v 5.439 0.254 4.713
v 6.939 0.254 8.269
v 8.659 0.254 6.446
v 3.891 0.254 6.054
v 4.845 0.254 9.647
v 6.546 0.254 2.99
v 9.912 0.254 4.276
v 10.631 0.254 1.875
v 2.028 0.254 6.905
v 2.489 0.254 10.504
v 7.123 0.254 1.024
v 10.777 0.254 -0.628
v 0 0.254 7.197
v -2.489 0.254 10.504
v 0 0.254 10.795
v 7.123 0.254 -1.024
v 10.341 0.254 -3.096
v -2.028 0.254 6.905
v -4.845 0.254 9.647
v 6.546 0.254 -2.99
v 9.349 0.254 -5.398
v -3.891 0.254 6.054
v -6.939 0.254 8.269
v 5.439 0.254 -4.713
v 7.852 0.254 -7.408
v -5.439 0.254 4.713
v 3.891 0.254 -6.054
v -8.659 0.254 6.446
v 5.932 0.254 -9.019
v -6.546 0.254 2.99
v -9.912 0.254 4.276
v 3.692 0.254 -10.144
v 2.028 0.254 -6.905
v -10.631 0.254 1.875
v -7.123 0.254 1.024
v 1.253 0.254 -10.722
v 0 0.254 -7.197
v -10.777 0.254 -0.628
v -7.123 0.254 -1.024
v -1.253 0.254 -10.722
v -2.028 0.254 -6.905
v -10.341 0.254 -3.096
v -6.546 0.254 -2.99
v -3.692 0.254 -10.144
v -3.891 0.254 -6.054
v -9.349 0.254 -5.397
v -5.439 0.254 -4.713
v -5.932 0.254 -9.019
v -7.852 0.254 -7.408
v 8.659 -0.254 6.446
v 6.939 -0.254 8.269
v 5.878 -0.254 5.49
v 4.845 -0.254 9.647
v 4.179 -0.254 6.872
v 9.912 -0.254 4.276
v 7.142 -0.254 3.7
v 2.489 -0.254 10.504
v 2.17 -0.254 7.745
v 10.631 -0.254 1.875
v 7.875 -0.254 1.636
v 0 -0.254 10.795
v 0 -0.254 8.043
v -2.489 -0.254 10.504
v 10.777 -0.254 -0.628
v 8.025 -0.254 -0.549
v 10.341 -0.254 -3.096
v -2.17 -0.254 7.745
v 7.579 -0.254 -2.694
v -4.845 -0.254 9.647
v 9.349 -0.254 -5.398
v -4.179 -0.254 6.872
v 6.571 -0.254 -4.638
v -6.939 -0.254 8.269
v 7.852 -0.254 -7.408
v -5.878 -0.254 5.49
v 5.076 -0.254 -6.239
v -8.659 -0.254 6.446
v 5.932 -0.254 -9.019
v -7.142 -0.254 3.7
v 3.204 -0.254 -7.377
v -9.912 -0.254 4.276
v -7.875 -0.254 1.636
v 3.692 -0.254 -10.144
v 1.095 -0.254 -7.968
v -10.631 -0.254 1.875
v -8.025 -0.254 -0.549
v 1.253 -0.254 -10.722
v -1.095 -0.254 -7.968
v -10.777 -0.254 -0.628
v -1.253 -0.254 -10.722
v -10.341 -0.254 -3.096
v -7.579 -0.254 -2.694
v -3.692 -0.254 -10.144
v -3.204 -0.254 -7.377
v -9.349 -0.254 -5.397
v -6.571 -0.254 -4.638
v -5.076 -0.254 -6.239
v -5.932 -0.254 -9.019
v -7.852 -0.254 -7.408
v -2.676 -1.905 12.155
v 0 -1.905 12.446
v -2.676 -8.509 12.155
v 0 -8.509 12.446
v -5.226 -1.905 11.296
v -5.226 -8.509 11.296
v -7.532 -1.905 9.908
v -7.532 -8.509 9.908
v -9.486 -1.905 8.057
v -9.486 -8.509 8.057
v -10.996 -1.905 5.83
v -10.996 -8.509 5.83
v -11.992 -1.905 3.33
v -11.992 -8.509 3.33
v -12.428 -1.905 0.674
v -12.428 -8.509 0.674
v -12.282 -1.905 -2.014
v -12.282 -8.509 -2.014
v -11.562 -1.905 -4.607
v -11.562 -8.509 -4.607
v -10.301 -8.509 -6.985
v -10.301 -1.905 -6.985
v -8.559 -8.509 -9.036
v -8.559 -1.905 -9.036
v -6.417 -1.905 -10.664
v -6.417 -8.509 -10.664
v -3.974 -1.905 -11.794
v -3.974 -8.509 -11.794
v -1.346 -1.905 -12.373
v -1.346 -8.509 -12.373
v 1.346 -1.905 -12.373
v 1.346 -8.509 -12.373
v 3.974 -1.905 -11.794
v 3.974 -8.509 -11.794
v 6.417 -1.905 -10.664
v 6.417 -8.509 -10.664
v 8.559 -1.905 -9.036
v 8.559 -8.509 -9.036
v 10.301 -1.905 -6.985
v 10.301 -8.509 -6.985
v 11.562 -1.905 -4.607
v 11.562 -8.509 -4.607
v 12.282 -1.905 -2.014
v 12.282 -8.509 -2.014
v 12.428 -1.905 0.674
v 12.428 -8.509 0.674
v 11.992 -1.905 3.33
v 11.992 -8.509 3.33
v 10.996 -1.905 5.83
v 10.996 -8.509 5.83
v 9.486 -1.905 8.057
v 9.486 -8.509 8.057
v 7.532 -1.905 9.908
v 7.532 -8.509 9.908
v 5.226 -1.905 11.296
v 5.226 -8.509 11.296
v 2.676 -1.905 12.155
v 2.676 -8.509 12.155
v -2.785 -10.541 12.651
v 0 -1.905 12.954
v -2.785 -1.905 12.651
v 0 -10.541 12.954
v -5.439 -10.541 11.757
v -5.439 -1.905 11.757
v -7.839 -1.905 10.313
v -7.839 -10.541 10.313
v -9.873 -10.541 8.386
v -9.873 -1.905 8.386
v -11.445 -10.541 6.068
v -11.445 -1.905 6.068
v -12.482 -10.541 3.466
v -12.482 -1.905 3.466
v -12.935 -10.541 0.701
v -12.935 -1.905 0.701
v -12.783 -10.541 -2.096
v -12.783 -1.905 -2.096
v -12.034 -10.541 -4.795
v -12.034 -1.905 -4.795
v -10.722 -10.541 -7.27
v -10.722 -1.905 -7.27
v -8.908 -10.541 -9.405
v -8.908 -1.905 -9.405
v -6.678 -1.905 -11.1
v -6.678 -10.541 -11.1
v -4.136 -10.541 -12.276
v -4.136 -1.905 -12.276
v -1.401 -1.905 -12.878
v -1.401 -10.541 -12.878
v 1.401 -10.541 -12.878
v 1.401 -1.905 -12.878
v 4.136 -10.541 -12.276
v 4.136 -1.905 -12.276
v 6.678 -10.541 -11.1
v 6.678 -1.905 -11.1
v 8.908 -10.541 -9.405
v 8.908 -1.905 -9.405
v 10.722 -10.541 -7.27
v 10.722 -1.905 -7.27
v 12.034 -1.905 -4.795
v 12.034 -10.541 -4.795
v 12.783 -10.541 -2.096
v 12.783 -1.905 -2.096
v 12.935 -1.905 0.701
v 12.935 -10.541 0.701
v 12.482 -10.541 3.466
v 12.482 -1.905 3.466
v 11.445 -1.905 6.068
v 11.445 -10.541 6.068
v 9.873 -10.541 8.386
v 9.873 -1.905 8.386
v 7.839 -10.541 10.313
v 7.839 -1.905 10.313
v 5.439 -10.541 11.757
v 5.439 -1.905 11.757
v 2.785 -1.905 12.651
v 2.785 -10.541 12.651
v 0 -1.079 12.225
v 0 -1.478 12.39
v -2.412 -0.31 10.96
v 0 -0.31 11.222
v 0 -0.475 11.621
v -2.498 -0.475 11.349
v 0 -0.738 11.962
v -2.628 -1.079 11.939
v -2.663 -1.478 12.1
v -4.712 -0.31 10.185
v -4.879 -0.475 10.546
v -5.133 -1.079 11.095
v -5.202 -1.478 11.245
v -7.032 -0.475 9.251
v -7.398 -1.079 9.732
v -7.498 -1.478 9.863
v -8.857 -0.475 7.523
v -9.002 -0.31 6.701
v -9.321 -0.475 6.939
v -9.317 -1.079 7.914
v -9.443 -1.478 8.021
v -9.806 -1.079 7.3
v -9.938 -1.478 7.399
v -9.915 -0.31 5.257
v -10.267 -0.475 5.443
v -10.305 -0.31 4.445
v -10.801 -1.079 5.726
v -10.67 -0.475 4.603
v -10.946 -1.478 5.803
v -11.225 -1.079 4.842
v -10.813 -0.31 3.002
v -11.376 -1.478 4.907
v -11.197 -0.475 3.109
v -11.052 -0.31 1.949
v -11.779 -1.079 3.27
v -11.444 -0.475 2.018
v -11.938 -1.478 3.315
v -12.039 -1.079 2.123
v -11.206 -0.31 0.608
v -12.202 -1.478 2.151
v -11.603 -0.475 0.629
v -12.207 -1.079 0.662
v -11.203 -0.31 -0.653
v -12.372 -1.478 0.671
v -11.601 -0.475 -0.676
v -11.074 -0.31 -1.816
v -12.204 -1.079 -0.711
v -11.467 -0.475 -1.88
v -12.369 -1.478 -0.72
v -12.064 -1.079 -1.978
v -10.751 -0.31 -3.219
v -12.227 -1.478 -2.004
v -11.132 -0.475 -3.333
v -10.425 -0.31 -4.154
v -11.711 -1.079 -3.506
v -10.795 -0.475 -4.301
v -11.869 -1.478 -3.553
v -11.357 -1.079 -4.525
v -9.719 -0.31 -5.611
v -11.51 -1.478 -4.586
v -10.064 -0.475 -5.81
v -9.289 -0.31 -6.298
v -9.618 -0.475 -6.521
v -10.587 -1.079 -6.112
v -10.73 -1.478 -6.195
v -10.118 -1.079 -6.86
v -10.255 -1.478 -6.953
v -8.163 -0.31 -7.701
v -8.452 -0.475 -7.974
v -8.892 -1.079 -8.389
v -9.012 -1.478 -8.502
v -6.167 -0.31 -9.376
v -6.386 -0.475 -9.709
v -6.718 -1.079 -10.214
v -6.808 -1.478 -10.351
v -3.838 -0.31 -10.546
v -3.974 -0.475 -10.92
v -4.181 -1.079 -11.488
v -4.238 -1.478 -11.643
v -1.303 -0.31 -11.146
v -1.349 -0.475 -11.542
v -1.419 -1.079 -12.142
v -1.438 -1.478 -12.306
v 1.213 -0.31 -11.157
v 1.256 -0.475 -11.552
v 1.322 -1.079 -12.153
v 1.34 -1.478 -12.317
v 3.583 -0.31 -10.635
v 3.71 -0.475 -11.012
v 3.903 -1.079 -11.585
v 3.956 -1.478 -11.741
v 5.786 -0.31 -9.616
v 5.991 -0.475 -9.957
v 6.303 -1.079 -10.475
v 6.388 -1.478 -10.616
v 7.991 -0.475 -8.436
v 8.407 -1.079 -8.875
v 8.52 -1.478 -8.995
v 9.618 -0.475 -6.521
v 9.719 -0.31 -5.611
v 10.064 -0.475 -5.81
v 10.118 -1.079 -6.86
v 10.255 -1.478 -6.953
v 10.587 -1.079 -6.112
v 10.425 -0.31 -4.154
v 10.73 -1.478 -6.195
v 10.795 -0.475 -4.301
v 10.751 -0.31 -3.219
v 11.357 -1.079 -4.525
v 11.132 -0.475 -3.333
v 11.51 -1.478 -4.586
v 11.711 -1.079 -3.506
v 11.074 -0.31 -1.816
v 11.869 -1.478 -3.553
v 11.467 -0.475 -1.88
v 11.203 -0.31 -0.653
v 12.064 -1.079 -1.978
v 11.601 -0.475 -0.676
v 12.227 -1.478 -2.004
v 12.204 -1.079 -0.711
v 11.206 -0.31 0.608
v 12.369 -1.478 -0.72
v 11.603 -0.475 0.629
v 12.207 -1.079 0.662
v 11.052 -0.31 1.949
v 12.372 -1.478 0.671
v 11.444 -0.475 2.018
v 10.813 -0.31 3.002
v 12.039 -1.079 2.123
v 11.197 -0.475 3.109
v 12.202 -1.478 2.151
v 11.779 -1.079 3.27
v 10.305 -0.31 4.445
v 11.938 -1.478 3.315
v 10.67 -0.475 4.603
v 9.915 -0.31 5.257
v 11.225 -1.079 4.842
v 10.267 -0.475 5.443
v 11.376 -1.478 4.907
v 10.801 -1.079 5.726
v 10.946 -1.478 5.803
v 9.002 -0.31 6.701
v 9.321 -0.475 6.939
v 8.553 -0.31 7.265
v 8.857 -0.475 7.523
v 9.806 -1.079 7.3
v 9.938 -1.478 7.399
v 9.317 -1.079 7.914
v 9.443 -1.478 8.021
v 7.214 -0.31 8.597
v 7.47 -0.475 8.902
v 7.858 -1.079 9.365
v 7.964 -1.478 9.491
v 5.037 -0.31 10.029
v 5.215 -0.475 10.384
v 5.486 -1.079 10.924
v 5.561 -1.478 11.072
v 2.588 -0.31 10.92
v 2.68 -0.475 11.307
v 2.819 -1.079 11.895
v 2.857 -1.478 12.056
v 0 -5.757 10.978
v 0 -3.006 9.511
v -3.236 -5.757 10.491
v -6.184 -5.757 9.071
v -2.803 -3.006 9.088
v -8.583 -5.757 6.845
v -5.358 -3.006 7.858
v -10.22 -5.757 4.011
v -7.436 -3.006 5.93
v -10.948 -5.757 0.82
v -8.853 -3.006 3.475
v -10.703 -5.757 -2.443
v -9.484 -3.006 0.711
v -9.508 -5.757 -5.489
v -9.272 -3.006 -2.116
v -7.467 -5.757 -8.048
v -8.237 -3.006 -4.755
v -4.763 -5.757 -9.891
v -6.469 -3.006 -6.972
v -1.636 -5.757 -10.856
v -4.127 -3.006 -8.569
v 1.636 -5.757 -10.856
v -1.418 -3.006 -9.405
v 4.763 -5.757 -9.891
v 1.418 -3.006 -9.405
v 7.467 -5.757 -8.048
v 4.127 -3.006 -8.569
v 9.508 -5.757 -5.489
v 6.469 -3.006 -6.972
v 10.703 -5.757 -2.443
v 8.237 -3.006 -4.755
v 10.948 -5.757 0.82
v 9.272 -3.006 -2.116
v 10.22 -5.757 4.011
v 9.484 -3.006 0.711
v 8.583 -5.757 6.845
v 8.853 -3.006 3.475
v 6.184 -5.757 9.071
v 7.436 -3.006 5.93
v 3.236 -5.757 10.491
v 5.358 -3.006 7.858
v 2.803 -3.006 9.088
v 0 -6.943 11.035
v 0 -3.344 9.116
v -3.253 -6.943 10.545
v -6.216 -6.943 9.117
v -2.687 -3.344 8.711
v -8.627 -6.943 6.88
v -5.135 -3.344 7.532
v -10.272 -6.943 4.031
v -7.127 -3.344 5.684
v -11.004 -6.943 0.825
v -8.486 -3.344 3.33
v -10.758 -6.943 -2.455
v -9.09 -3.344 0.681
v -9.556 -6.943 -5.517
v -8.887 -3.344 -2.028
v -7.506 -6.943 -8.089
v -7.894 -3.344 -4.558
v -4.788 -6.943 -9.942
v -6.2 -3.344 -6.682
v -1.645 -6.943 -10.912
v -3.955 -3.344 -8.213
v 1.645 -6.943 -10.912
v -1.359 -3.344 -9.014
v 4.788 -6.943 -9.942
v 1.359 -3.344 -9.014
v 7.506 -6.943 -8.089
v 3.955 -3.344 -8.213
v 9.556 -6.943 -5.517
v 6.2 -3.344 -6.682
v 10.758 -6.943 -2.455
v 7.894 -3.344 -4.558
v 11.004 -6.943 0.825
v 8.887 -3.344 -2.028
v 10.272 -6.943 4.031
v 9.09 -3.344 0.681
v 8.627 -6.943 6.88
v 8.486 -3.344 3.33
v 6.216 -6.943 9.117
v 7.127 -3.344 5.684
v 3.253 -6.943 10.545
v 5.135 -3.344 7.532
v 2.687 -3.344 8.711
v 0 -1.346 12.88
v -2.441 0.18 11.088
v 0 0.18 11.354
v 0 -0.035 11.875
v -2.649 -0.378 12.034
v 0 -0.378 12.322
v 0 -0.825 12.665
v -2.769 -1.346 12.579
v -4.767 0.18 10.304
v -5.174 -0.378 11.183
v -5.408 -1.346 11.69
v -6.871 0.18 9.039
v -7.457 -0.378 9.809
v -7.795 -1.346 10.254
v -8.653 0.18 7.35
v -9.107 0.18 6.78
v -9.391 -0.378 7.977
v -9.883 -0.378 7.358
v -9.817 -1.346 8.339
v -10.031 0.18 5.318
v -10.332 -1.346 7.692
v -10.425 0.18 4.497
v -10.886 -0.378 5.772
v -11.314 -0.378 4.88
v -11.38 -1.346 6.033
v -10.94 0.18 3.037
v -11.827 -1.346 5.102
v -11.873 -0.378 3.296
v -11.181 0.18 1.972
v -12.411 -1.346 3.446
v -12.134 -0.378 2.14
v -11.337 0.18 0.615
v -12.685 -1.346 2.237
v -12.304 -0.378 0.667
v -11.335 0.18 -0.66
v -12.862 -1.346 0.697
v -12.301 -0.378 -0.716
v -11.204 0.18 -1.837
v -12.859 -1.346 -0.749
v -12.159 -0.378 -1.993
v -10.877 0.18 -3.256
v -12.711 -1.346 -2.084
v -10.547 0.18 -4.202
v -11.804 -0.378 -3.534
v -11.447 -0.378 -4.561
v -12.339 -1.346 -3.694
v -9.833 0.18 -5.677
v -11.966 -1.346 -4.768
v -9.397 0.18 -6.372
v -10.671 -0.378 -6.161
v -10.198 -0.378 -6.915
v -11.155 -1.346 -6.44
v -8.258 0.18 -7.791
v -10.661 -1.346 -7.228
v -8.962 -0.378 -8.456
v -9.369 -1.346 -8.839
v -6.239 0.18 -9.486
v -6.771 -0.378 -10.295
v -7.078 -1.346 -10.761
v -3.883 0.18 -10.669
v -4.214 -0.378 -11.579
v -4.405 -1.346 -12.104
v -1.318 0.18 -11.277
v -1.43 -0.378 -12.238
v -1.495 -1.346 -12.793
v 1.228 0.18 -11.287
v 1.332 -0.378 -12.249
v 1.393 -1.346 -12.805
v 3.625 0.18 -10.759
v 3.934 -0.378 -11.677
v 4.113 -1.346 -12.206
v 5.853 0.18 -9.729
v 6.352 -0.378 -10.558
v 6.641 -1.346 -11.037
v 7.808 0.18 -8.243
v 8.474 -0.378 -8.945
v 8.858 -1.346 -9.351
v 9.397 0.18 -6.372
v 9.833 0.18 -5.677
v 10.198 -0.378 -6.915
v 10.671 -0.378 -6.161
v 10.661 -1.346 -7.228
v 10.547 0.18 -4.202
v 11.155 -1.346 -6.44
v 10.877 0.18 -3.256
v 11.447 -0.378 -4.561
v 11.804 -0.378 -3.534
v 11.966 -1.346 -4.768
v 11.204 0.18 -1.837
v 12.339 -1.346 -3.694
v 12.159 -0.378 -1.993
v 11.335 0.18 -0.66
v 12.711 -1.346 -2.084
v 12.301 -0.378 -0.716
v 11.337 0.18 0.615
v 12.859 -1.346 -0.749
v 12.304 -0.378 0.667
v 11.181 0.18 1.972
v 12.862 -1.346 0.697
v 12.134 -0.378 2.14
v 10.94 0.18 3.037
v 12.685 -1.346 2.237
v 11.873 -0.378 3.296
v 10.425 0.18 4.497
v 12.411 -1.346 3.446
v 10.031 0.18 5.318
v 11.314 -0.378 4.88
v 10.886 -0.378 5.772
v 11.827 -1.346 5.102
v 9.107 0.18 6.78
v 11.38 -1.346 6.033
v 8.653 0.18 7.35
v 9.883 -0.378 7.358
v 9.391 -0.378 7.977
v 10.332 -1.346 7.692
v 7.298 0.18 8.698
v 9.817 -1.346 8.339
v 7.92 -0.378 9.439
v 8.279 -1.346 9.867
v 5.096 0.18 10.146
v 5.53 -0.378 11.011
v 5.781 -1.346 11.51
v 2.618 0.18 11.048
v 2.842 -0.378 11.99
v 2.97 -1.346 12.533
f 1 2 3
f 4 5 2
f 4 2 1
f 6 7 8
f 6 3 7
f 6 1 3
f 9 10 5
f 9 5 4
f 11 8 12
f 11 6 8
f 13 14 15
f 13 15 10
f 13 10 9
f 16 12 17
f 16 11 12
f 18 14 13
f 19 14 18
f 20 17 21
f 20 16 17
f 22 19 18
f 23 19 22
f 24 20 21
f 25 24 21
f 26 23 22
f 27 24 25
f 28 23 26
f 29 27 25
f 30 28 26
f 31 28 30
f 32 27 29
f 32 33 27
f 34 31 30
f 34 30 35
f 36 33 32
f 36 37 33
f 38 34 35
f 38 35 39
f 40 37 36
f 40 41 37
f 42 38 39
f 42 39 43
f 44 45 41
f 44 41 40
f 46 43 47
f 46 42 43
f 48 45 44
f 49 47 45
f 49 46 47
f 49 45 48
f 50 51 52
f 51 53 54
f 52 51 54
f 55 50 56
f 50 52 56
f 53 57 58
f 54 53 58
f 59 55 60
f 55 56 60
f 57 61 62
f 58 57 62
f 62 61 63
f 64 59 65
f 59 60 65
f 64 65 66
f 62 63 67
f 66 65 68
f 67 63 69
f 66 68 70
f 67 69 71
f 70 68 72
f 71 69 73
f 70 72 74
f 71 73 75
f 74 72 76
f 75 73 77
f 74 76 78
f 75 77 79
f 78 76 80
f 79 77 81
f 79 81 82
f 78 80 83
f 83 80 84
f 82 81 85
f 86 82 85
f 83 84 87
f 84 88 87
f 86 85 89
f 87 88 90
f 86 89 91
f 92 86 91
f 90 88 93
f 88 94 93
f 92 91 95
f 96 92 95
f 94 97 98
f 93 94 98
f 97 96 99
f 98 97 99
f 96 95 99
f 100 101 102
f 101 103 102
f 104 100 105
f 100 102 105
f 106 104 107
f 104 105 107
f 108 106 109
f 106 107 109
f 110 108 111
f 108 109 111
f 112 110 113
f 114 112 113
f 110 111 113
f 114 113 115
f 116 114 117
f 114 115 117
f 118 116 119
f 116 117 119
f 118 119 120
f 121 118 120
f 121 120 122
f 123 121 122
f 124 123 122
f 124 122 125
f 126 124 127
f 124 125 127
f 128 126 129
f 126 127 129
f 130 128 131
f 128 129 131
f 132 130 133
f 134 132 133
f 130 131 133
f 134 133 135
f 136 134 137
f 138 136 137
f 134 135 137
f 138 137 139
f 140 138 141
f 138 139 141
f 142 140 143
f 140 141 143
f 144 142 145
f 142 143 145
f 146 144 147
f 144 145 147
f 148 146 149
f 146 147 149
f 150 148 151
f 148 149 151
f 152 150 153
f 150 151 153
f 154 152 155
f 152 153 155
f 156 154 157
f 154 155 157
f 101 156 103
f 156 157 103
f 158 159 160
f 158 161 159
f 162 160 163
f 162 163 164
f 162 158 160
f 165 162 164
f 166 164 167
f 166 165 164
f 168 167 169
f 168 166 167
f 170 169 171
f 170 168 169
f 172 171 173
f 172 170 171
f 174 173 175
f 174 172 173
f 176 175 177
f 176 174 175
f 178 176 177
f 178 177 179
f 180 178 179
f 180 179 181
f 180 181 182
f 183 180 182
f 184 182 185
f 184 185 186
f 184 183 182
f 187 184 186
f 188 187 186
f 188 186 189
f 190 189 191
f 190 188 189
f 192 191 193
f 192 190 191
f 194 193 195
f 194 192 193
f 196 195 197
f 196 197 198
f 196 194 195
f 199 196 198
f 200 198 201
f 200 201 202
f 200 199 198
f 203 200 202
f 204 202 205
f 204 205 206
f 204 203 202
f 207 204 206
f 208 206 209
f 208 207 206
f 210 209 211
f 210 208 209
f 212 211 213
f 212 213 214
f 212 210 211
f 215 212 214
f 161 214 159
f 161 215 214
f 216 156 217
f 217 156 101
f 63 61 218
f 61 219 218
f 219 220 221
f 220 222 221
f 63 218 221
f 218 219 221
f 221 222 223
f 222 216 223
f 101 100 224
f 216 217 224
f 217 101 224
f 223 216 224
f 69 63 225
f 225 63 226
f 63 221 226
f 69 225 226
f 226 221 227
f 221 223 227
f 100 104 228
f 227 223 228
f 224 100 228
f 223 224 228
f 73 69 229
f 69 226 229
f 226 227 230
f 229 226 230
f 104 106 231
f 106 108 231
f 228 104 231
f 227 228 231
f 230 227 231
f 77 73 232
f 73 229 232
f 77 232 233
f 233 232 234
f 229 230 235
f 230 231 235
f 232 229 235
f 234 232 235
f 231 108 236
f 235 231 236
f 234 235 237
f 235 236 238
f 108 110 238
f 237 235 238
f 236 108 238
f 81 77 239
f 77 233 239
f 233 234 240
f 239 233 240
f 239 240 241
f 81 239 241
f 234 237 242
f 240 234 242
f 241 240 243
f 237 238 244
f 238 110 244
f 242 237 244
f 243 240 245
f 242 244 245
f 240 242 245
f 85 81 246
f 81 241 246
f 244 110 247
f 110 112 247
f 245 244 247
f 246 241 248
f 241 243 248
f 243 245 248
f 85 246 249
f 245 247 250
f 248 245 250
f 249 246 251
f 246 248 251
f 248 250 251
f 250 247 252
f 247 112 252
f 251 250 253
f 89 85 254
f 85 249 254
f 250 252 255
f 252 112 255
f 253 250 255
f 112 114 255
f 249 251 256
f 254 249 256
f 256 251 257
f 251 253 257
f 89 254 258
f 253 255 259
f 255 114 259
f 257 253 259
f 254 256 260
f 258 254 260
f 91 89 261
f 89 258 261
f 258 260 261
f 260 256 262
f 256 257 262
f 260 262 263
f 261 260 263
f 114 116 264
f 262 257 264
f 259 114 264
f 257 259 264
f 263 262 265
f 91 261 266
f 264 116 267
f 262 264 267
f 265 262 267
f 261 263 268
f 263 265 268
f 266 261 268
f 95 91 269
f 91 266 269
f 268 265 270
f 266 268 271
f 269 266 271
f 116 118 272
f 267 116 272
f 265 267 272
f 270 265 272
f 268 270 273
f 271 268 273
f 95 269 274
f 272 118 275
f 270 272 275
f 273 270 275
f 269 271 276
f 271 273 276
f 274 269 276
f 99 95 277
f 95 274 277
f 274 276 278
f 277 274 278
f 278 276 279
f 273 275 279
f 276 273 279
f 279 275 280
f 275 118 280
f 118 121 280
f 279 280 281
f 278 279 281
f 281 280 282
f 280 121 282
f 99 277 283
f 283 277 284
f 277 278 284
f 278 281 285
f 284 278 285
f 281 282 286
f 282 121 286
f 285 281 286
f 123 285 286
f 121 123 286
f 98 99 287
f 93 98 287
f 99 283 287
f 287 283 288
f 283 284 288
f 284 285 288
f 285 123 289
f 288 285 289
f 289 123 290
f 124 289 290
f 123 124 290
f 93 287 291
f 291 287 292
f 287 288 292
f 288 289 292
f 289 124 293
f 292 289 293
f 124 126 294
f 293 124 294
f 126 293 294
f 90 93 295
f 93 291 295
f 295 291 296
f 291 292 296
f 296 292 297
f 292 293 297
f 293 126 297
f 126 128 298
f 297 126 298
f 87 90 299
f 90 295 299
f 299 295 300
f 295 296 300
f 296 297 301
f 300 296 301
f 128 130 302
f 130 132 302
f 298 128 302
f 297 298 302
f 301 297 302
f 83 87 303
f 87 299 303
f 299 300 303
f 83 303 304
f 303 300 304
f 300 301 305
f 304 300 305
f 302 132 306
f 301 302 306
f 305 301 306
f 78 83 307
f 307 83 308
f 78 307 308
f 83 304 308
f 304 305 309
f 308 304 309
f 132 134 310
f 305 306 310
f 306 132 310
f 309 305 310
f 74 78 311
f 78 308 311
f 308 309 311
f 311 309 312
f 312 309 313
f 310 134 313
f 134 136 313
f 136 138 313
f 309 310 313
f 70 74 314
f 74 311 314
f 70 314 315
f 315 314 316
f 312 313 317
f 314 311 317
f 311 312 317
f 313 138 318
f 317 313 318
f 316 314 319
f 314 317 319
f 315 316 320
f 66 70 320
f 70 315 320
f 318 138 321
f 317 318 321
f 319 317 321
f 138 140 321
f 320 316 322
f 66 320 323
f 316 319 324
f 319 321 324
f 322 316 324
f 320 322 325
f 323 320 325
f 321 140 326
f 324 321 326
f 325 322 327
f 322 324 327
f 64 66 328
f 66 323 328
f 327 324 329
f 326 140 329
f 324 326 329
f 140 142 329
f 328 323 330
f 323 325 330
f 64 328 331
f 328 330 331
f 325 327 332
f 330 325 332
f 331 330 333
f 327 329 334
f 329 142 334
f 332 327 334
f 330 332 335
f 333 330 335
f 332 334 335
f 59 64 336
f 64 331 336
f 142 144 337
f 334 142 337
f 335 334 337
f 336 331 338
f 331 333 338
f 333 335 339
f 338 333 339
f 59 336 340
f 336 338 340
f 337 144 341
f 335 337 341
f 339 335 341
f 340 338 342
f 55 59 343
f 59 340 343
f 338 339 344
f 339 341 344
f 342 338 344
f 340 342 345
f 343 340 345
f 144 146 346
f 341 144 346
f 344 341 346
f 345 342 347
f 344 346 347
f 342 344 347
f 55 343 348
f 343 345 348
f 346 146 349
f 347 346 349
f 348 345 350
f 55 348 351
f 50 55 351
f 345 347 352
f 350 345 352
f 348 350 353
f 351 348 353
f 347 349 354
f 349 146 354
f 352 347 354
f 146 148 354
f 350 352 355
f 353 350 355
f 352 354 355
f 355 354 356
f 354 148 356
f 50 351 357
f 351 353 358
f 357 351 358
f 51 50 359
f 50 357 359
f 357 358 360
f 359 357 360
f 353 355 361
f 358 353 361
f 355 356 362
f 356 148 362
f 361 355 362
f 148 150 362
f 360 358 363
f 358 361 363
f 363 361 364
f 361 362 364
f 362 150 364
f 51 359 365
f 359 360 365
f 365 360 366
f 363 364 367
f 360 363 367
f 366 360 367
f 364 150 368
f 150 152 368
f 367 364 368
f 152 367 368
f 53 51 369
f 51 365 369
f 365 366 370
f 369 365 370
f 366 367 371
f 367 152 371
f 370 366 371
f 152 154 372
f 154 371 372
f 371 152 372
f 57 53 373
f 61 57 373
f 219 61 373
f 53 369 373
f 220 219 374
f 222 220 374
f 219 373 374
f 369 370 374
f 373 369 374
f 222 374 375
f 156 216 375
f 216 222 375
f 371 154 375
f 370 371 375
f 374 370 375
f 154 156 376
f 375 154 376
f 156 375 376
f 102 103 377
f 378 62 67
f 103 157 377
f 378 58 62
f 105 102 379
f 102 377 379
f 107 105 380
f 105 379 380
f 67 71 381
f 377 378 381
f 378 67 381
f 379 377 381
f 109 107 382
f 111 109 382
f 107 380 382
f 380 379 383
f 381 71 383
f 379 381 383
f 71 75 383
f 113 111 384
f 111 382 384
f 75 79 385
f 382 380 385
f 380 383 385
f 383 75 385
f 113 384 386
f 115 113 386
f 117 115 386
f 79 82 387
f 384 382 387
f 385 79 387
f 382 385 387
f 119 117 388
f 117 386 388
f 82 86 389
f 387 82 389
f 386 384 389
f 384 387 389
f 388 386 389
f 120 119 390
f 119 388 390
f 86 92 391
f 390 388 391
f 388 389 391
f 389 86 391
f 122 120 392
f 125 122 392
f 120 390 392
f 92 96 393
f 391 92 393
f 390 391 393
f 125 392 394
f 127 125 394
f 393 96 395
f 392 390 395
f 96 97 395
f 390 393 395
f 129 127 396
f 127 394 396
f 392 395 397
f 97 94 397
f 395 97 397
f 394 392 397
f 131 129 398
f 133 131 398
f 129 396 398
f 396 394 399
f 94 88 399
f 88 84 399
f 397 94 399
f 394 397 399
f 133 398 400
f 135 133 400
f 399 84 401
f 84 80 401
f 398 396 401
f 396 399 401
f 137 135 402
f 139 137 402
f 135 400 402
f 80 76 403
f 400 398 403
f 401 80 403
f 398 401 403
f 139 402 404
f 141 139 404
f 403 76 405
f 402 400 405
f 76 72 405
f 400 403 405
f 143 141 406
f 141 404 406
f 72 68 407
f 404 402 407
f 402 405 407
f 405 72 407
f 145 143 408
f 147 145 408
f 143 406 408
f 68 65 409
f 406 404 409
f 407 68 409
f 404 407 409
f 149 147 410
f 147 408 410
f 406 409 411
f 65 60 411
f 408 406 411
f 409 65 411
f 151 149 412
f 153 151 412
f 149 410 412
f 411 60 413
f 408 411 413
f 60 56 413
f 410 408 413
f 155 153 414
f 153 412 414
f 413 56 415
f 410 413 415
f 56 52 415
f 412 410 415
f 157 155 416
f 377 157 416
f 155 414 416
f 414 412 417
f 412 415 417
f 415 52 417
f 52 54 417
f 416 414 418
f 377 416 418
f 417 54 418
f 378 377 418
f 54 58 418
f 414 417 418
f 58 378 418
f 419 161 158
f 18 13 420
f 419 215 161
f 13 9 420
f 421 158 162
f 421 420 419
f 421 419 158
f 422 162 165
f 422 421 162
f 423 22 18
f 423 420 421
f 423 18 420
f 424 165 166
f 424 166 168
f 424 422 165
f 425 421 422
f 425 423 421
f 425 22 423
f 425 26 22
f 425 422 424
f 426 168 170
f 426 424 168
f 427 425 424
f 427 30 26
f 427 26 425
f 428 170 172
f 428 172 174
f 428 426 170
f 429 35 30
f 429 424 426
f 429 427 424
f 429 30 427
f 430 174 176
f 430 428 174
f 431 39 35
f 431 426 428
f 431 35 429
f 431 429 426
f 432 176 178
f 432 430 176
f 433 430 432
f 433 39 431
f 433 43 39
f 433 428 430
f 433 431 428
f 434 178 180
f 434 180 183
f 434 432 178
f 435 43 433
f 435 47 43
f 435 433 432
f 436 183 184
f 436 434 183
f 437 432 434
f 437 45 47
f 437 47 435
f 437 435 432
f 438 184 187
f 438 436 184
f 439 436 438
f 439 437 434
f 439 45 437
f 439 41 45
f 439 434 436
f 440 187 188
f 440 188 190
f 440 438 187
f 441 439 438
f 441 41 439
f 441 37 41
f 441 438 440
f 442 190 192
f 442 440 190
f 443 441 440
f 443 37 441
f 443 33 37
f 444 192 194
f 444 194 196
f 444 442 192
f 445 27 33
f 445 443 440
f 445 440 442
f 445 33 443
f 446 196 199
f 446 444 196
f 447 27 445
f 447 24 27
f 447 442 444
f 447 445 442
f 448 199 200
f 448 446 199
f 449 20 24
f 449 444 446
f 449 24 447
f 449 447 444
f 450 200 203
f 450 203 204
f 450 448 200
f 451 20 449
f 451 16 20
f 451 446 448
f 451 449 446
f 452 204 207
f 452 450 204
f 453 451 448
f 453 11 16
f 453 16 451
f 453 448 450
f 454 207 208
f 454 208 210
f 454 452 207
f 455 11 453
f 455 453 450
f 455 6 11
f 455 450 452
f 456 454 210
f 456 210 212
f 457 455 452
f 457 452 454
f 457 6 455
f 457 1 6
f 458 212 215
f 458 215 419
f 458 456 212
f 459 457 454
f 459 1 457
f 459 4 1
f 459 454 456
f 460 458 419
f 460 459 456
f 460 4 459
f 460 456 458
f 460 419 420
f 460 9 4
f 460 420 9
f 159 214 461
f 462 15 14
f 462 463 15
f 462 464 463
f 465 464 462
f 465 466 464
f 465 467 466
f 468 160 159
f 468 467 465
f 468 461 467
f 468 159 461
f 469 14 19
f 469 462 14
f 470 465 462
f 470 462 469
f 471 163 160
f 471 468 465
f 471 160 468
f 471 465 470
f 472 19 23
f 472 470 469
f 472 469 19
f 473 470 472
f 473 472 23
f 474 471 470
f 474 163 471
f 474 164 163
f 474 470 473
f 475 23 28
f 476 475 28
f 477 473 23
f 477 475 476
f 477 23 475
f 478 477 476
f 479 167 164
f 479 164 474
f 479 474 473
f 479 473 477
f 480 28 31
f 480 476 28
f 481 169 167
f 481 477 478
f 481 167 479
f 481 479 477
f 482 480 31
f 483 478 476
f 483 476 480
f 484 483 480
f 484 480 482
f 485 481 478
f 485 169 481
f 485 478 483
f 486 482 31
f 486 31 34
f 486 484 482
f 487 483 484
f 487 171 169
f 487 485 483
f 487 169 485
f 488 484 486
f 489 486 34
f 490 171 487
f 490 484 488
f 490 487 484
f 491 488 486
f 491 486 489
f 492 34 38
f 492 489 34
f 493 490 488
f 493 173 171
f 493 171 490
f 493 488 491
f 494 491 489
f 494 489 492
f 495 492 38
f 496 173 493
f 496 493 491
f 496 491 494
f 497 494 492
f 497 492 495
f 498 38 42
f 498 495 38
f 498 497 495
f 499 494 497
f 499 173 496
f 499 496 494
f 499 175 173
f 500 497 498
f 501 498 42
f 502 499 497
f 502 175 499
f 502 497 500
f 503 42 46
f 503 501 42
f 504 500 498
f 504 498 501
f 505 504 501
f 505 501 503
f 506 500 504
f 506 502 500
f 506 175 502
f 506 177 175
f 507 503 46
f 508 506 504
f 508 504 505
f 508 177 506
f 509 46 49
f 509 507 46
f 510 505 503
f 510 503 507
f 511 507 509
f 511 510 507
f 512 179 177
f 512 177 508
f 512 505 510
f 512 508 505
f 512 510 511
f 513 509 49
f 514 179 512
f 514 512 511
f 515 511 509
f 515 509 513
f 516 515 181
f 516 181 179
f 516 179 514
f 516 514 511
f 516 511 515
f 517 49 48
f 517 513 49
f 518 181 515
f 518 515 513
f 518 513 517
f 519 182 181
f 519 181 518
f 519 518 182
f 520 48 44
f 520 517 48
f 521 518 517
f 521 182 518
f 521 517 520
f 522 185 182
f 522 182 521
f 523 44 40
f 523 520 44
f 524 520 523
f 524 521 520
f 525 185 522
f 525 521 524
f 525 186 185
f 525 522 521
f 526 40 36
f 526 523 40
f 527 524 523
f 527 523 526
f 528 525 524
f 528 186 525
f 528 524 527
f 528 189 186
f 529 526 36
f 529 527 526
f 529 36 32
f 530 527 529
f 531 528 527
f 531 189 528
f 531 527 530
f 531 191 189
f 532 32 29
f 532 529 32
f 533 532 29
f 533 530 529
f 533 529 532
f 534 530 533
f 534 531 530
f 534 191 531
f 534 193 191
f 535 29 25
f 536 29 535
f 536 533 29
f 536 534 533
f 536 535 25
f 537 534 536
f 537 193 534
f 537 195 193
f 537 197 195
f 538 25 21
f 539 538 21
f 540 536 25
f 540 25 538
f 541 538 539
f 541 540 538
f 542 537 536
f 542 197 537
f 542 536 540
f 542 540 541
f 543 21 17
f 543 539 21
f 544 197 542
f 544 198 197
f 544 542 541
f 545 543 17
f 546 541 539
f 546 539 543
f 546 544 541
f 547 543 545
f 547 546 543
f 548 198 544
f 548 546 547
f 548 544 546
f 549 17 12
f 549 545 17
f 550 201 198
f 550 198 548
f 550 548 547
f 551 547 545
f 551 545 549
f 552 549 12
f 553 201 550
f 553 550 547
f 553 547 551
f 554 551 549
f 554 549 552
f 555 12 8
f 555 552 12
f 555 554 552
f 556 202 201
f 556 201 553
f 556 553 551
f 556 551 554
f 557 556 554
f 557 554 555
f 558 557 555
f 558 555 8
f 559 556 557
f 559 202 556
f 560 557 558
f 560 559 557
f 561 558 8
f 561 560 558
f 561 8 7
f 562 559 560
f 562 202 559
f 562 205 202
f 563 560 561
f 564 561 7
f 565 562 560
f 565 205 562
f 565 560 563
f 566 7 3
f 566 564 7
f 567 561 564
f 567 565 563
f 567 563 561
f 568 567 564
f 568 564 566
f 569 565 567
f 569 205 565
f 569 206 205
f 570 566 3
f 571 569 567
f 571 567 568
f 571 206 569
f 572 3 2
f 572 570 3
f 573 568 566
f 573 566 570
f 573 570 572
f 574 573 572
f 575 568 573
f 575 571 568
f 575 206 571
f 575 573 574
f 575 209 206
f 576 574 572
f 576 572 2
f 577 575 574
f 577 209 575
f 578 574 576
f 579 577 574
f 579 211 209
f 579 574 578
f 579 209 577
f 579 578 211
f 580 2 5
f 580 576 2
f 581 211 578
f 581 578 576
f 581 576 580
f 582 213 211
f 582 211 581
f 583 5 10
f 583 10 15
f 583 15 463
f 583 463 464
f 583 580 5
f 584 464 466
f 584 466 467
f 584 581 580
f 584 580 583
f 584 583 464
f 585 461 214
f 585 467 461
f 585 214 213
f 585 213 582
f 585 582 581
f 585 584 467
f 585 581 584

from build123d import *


with BuildPart() as part:
    # Sketch1 → Revolve-Thin1 (revolve)
    with BuildSketch(Plane.XY, mode=Mode.PRIVATE) as revolve_thin1_sk:
        with BuildLine():
            Line((12.954, -1.905), (12.954, -10.541))
            Line((12.954, -10.541), (7.196666667, 0.254))
            Line((7.196666667, 0.254), (10.795, 0.254))
            ThreePointArc((10.795, 0.254), (12.321643541, -0.378356459), (12.954, -1.905))
        make_face()
        with BuildLine():
            Line((12.446, -1.905), (12.446, -8.509))
            Line((12.446, -8.509), (8.043333333, -0.254))
            Line((8.043333333, -0.254), (10.795, -0.254))
            ThreePointArc((10.795, -0.254), (11.962433296, -0.737566704), (12.446, -1.905))
        make_face(mode=Mode.SUBTRACT)
    revolve(revolve_thin1_sk.sketch.rotate(Axis((0, 31.836101695, 0), (0, -1, 0)), 90), axis=Axis((0, 31.836101695, 0), (0, -1, 0)))


solid = part.part
